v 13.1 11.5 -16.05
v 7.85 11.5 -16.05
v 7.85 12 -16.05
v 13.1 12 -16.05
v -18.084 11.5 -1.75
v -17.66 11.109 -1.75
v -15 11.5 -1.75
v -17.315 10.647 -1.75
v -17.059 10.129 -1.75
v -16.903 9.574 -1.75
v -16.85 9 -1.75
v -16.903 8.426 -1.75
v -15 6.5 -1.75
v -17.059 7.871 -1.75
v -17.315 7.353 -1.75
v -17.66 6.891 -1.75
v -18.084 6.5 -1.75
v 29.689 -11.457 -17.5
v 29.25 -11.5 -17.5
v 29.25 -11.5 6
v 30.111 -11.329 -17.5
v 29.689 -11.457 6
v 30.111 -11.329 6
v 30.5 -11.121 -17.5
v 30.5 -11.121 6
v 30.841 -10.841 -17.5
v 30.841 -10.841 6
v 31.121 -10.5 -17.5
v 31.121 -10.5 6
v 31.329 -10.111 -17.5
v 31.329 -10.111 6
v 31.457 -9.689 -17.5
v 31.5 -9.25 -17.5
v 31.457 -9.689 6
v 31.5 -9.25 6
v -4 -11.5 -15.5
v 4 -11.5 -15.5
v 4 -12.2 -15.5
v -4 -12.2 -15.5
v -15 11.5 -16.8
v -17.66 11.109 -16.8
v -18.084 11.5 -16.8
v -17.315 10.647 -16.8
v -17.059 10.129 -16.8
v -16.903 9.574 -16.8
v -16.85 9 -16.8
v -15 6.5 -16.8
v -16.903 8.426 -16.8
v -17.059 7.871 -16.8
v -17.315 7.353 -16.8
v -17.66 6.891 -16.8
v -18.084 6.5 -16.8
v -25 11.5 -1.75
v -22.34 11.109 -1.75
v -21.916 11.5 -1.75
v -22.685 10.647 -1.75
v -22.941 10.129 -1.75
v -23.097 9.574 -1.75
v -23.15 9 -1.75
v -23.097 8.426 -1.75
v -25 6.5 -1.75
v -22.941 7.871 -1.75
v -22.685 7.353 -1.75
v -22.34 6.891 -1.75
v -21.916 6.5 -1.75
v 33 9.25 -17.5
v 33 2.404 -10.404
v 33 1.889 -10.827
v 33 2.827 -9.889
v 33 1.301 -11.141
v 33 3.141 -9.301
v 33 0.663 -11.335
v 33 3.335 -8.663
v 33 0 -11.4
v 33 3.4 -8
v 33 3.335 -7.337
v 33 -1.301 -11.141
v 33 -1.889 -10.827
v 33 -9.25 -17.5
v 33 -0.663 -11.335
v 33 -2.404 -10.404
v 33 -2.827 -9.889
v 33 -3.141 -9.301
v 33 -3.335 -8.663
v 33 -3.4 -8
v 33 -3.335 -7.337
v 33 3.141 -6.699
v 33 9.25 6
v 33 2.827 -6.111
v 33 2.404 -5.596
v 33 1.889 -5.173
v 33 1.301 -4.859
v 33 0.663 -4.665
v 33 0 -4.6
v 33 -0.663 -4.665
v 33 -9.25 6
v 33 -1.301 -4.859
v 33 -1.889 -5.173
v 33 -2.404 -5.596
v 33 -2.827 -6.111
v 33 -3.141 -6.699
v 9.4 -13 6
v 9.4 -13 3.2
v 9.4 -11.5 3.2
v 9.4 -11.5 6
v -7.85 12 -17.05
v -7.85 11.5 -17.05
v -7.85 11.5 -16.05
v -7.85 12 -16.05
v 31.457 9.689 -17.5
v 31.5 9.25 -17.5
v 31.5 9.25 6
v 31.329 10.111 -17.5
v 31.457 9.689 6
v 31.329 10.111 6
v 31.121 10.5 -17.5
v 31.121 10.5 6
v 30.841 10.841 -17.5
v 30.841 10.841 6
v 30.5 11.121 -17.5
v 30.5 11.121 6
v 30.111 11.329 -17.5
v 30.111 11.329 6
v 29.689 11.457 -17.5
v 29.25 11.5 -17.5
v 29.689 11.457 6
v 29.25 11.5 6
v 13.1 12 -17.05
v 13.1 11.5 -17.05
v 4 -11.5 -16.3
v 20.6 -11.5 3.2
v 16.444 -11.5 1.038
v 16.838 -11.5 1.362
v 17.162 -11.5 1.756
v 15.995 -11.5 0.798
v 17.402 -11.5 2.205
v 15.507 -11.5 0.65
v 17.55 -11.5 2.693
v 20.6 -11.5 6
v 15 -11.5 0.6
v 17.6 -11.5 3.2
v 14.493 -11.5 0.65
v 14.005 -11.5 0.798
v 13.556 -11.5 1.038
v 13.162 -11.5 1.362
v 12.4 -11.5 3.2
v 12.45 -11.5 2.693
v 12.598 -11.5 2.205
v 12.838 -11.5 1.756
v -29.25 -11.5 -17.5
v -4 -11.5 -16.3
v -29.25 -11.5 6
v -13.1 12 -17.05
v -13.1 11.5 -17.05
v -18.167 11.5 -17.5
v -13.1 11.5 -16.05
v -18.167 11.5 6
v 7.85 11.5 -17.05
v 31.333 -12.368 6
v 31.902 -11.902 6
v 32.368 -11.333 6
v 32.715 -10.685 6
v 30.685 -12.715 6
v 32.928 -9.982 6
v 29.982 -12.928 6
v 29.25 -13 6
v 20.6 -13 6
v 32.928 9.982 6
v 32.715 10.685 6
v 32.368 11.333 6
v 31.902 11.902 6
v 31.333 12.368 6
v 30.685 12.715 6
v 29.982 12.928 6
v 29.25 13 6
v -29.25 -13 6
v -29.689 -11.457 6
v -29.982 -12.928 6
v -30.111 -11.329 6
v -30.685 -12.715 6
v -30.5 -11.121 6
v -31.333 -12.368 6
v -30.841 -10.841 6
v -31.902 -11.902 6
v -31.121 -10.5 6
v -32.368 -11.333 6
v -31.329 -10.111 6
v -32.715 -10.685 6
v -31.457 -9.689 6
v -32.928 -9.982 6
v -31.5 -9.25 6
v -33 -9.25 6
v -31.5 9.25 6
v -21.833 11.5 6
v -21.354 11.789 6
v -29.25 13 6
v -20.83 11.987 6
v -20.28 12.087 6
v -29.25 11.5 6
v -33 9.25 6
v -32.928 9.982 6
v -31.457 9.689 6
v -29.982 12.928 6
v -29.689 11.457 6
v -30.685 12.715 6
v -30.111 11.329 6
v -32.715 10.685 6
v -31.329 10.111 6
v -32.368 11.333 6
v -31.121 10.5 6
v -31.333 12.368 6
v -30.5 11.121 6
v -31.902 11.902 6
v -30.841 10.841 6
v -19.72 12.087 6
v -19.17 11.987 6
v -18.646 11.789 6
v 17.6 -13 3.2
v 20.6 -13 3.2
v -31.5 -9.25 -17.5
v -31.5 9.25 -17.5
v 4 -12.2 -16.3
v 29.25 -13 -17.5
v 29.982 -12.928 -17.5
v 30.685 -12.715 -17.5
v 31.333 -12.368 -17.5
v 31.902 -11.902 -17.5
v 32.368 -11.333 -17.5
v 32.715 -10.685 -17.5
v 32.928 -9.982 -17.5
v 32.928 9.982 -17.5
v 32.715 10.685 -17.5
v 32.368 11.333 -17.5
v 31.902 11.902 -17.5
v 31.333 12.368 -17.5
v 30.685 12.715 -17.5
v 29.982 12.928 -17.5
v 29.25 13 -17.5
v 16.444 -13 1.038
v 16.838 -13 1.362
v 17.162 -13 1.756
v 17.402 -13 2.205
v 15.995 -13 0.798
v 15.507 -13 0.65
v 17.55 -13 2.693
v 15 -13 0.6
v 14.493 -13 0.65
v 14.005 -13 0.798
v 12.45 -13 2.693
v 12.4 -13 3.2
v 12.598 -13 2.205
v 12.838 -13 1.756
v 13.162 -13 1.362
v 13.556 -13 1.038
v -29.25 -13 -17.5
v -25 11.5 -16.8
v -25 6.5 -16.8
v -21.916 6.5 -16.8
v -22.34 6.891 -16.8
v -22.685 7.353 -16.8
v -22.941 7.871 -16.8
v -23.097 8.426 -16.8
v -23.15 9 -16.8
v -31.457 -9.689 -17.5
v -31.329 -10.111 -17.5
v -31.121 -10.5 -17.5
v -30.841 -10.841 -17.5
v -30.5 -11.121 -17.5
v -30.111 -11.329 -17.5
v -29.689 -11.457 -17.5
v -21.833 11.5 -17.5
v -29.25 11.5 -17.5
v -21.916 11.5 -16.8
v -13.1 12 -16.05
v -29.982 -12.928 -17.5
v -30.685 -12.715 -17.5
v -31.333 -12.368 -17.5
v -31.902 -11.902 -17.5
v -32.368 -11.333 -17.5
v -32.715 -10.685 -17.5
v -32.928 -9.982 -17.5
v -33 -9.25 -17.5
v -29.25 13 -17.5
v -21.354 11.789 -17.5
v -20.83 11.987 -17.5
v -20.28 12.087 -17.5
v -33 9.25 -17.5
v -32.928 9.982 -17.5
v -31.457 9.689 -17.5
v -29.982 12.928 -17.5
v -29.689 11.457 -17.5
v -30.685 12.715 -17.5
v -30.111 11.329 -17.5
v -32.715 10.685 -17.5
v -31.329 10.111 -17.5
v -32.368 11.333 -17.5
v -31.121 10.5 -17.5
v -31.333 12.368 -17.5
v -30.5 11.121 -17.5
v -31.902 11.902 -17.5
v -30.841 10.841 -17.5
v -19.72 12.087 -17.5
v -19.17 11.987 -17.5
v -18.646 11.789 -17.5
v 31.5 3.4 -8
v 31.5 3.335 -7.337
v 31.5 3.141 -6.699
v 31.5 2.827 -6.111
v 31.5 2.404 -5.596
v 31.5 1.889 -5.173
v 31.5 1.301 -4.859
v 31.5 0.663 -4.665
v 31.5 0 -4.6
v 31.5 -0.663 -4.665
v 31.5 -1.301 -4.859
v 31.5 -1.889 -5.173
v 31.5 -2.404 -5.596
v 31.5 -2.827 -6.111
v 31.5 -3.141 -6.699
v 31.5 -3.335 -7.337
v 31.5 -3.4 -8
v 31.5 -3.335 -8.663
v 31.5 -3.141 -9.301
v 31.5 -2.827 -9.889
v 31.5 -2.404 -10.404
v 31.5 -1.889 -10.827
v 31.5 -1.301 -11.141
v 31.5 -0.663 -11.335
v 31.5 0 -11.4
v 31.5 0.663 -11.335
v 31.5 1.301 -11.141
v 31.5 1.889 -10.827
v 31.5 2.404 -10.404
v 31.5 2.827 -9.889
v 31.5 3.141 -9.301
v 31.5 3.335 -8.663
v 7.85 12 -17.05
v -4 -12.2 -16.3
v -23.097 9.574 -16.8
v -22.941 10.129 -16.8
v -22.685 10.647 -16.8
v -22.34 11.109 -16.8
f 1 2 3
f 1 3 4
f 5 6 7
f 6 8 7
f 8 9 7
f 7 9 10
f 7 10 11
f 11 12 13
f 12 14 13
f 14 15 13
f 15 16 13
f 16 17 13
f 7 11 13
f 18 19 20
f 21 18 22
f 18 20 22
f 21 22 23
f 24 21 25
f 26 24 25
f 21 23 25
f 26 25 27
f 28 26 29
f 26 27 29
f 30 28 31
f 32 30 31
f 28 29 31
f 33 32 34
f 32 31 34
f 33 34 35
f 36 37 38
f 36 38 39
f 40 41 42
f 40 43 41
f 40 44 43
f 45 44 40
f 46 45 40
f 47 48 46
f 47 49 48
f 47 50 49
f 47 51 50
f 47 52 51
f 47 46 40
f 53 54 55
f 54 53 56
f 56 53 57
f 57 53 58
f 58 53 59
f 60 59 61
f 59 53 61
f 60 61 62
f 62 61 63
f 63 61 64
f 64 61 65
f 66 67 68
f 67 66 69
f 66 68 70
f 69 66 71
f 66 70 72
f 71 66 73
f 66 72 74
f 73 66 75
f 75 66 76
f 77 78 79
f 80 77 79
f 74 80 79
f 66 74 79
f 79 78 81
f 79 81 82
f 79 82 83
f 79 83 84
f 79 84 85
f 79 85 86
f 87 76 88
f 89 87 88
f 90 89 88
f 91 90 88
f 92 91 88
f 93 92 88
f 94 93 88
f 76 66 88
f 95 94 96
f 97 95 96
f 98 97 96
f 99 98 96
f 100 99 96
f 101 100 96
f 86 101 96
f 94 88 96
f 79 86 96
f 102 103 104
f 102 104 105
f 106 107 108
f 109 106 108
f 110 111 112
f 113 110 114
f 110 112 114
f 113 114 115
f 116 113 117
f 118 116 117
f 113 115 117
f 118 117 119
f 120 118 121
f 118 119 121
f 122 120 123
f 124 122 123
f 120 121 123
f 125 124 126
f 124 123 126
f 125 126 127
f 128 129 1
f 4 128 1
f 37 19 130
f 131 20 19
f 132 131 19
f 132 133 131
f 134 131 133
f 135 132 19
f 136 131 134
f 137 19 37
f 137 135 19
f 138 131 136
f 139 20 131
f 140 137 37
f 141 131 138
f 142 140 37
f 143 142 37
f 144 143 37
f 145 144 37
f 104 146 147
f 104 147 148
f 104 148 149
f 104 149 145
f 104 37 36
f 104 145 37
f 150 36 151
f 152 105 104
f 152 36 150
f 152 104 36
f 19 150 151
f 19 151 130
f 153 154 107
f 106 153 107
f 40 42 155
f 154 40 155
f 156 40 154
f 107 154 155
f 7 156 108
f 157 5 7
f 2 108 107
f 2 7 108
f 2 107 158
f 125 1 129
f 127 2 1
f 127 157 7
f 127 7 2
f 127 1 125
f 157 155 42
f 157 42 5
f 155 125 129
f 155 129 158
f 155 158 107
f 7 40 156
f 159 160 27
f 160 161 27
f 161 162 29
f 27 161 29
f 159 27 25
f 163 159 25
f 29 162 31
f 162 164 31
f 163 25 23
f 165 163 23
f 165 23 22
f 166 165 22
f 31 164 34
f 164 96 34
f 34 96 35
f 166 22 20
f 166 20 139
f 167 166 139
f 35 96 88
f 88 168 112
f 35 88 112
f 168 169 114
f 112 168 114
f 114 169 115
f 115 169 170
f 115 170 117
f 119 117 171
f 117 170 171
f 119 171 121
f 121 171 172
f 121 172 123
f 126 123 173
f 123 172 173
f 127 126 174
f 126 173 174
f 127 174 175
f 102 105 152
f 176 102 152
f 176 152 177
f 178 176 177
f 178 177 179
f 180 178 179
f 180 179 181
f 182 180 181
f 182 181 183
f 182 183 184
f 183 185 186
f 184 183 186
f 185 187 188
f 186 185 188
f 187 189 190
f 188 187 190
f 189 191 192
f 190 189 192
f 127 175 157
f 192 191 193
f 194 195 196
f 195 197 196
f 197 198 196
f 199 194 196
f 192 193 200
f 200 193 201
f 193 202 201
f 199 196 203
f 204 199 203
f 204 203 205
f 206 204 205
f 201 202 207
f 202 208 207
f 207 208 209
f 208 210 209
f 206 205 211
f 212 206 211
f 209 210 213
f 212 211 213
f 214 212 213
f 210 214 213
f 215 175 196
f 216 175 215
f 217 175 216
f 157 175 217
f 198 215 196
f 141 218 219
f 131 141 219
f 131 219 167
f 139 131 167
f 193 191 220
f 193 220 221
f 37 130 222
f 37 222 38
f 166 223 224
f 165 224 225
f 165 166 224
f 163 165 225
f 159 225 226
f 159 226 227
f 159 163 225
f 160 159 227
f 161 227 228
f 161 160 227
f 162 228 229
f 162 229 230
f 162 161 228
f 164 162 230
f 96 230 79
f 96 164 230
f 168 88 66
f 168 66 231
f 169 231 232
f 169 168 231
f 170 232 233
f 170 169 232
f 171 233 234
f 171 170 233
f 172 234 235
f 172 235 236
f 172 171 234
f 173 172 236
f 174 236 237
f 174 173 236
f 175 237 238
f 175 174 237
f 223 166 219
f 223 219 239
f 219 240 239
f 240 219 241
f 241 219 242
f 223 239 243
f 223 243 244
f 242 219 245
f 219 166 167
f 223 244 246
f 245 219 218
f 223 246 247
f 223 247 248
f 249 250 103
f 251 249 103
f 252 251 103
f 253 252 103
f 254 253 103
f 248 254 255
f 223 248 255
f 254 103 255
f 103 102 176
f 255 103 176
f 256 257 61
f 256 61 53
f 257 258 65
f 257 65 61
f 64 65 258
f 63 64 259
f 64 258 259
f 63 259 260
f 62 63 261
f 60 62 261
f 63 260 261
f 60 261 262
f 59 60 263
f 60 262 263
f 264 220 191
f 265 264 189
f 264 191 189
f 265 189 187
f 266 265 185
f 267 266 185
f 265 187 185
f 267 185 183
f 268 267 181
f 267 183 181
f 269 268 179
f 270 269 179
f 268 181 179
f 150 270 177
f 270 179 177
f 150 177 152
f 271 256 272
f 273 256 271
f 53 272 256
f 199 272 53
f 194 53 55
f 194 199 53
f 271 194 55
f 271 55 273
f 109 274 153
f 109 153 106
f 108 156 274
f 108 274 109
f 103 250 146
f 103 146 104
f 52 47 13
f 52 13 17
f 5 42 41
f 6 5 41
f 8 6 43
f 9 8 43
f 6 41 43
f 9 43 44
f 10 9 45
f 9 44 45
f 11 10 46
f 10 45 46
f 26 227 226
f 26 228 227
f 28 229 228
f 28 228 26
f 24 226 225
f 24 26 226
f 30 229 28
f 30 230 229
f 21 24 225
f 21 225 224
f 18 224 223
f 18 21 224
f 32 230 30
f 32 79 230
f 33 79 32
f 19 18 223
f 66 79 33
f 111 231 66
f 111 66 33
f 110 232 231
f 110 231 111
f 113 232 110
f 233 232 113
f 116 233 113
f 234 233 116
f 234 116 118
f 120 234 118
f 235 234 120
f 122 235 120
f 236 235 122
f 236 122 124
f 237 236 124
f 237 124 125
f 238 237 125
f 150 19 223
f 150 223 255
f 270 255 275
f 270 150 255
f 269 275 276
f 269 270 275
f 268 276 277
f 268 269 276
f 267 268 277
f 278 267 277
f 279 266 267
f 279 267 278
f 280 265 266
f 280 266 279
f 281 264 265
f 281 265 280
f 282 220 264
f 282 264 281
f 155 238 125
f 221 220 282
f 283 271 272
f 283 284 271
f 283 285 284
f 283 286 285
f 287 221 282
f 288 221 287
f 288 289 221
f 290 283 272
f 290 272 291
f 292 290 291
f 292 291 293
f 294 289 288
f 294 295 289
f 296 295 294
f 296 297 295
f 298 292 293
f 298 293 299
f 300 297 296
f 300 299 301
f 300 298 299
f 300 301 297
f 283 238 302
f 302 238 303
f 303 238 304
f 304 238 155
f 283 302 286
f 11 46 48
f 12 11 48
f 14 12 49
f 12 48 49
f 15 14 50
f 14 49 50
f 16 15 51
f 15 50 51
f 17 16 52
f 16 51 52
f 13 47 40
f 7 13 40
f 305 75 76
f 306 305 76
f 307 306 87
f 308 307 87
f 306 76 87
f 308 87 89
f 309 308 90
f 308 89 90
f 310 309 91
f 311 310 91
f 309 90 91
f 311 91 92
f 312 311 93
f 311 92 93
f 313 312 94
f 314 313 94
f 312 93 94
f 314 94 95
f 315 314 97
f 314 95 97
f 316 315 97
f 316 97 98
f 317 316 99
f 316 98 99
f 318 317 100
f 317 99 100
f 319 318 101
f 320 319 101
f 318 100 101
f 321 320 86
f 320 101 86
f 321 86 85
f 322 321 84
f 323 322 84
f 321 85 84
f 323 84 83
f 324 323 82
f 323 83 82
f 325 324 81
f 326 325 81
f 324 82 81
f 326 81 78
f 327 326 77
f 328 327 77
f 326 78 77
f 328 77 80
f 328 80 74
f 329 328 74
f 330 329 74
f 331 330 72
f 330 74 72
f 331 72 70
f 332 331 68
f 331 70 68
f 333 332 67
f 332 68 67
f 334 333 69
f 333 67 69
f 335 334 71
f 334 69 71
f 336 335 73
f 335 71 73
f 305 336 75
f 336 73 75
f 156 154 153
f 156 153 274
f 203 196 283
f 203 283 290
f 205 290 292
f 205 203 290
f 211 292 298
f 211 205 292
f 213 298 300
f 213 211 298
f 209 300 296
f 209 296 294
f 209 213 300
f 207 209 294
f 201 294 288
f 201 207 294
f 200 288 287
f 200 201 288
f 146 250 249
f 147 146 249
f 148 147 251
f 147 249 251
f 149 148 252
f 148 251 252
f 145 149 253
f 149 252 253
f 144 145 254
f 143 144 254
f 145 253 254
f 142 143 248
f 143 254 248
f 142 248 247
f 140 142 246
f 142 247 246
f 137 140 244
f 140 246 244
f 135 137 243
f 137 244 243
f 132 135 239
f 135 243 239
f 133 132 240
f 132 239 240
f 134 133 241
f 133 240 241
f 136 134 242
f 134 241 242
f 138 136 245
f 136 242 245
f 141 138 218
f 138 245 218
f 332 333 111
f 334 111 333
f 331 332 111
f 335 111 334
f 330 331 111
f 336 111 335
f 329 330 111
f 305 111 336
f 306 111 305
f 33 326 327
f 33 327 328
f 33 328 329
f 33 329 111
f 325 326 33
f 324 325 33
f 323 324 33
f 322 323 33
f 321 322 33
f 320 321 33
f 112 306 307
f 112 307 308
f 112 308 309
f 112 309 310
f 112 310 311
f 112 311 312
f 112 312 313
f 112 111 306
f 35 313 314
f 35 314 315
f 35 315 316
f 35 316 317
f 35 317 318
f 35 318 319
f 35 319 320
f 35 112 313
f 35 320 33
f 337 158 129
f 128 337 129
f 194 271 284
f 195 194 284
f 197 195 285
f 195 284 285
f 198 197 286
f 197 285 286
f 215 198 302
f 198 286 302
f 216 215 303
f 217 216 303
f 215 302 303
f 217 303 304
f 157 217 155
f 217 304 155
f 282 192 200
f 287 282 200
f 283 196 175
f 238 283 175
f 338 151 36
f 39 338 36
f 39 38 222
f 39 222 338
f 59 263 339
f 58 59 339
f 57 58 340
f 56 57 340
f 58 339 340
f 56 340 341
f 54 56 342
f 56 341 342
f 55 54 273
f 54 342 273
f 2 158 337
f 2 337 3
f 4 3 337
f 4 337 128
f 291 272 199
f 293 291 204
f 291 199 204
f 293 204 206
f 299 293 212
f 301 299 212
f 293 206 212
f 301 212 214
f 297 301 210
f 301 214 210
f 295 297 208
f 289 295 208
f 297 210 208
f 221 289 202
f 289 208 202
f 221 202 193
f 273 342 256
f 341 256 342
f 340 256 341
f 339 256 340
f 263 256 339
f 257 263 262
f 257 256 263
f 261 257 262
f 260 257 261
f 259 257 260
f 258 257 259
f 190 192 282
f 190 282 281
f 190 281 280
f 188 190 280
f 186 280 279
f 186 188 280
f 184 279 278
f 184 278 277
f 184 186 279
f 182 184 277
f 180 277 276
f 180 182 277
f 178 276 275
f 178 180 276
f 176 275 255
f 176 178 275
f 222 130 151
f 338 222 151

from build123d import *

# Parameters (mm, degrees)
PAD_DEPTH       = 23.5
SKETCH014_W     = 8
SKETCH014_H     = 0.8
POCKET001_DEPTH = 0.7
SKETCH015_W     = 5.25
SKETCH015_H     = 1
POCKET002_DEPTH = 0.5
SKETCH020_R     = 3.4
POCKET005_DEPTH = 1.5
POCKET006_DEPTH = 1.5
SKETCH025_R     = 3.1
POCKET008_DEPTH = 23.5
PAD015_DEPTH    = 15.75
SKETCH029_W     = 10
SKETCH029_H     = 5
POCKET009_DEPTH = 0.7


with BuildPart() as part:
    # Sketch → Pad (new body)
    with BuildSketch(Plane.XY.offset(6)):
        with BuildLine():
            Line((-29.25, 13), (29.25, 13))
            ThreePointArc((33, 9.25), (31.9016504294, 11.9016504294), (29.25, 13))
            Line((33, 9.25), (33, -9.25))
            ThreePointArc((29.25, -13), (31.9016504295, -11.9016504294), (33, -9.25))
            Line((29.25, -13), (-29.25, -13))
            ThreePointArc((-33, -9.25), (-31.9016504294, -11.9016504295), (-29.25, -13))
            Line((-33, -9.25), (-33, 9.25))
            ThreePointArc((-29.25, 13), (-31.9016504294, 11.9016504294), (-33, 9.25))
        make_face()
        with BuildLine():
            Line((-29.25, 11.5), (29.25, 11.5))
            ThreePointArc((31.5, 9.25), (30.8409902577, 10.8409902577), (29.25, 11.5))
            Line((31.5, 9.25), (31.5, -9.25))
            ThreePointArc((29.25, -11.5), (30.8409902577, -10.8409902577), (31.5, -9.25))
            Line((29.25, -11.5), (-29.25, -11.5))
            ThreePointArc((-31.5, -9.25), (-30.8409902577, -10.8409902577), (-29.25, -11.5))
            Line((-31.5, -9.25), (-31.5, 9.25))
            ThreePointArc((-29.25, 11.5), (-30.8409902577, 10.8409902577), (-31.5, 9.25))
        make_face(mode=Mode.SUBTRACT)
    extrude(amount=-PAD_DEPTH)

    # Sketch014 → Pocket001 (cut)
    with BuildSketch(Plane(origin=(0, -11.5, 6), x_dir=(-1, 0, 0), z_dir=(0, 1, 0))):
        with Locations((0, -21.9)):
            Rectangle(SKETCH014_W, SKETCH014_H)
    extrude(amount=-POCKET001_DEPTH, mode=Mode.SUBTRACT)

    # Sketch015 → Pocket002 (cut)
    with BuildSketch(Plane(origin=(0, 11.5, 6), x_dir=(1, 0, 0), z_dir=(0, -1, 0))):
        with Locations((-10.475, -22.55)):
            Rectangle(SKETCH015_W, SKETCH015_H)
        with Locations((10.475, -22.55)):
            Rectangle(SKETCH015_W, SKETCH015_H)
    extrude(amount=-POCKET002_DEPTH, mode=Mode.SUBTRACT)

    # Sketch020 → Pocket005 (cut)
    with BuildSketch(Plane(origin=(33, 0, 6), x_dir=(0, 1, 0), z_dir=(1, 0, 0))):
        with Locations((0, -14)):
            Circle(SKETCH020_R)
    extrude(amount=-POCKET005_DEPTH, mode=Mode.SUBTRACT)

    # Sketch022 → Pocket006 (cut)
    with BuildSketch(Plane(origin=(0, -13, 6), x_dir=(1, 0, 0), z_dir=(0, -1, 0))):
        with BuildLine():
            ThreePointArc((12.4, -2.8), (15, -5.4), (17.6, -2.8))
            Line((17.6, -2.8), (20.6, -2.8))
            Line((20.6, -2.8), (20.6, 0.1))
            Line((9.4, 0.1), (20.6, 0.1))
            Line((9.4, -2.8), (9.4, 0.1))
            Line((12.4, -2.8), (9.4, -2.8))
        make_face()
    extrude(amount=-POCKET006_DEPTH, mode=Mode.SUBTRACT)

    # Sketch025 → Pocket008 (cut)
    with BuildSketch(Plane(origin=(0, 0, -17.5), x_dir=(1, 0, 0), z_dir=(0, 0, -1))):
        with Locations((-20, -9)):
            Circle(SKETCH025_R)
    extrude(amount=-POCKET008_DEPTH, mode=Mode.SUBTRACT)

    # Sketch026 → Pad015 (new body)
    with BuildSketch(Plane(origin=(0, 0, -17.5), x_dir=(1, 0, 0), z_dir=(0, 0, -1))):
        with BuildLine():
            Line((-15, -6.5), (-18.0836232103, -6.5))
            ThreePointArc((-16.85, -9), (-17.1751914324, -7.6061002345), (-18.0836232103, -6.5))
            ThreePointArc((-18.0836232103, -11.5), (-17.1751914324, -10.3938997655), (-16.85, -9))
            Line((-18.0836232103, -11.5), (-15, -11.5))
            Line((-15, -6.5), (-15, -11.5))
        make_face()
        with BuildLine():
            Line((-25, -11.5), (-21.9163767897, -11.5))
            ThreePointArc((-23.15, -9), (-22.8248085676, -10.3938997655), (-21.9163767897, -11.5))
            ThreePointArc((-21.9163767897, -6.5), (-22.8248085676, -7.6061002345), (-23.15, -9))
            Line((-21.9163767897, -6.5), (-25, -6.5))
            Line((-25, -6.5), (-25, -11.5))
        make_face()
    extrude(amount=-PAD015_DEPTH)

    # Sketch029 → Pocket009 (cut)
    with BuildSketch(Plane(origin=(0, 0, -17.5), x_dir=(1, 0, 0), z_dir=(0, 0, -1))):
        with Locations((-20, -9)):
            Rectangle(SKETCH029_W, SKETCH029_H)
    extrude(amount=-POCKET009_DEPTH, mode=Mode.SUBTRACT)


solid = part.part
